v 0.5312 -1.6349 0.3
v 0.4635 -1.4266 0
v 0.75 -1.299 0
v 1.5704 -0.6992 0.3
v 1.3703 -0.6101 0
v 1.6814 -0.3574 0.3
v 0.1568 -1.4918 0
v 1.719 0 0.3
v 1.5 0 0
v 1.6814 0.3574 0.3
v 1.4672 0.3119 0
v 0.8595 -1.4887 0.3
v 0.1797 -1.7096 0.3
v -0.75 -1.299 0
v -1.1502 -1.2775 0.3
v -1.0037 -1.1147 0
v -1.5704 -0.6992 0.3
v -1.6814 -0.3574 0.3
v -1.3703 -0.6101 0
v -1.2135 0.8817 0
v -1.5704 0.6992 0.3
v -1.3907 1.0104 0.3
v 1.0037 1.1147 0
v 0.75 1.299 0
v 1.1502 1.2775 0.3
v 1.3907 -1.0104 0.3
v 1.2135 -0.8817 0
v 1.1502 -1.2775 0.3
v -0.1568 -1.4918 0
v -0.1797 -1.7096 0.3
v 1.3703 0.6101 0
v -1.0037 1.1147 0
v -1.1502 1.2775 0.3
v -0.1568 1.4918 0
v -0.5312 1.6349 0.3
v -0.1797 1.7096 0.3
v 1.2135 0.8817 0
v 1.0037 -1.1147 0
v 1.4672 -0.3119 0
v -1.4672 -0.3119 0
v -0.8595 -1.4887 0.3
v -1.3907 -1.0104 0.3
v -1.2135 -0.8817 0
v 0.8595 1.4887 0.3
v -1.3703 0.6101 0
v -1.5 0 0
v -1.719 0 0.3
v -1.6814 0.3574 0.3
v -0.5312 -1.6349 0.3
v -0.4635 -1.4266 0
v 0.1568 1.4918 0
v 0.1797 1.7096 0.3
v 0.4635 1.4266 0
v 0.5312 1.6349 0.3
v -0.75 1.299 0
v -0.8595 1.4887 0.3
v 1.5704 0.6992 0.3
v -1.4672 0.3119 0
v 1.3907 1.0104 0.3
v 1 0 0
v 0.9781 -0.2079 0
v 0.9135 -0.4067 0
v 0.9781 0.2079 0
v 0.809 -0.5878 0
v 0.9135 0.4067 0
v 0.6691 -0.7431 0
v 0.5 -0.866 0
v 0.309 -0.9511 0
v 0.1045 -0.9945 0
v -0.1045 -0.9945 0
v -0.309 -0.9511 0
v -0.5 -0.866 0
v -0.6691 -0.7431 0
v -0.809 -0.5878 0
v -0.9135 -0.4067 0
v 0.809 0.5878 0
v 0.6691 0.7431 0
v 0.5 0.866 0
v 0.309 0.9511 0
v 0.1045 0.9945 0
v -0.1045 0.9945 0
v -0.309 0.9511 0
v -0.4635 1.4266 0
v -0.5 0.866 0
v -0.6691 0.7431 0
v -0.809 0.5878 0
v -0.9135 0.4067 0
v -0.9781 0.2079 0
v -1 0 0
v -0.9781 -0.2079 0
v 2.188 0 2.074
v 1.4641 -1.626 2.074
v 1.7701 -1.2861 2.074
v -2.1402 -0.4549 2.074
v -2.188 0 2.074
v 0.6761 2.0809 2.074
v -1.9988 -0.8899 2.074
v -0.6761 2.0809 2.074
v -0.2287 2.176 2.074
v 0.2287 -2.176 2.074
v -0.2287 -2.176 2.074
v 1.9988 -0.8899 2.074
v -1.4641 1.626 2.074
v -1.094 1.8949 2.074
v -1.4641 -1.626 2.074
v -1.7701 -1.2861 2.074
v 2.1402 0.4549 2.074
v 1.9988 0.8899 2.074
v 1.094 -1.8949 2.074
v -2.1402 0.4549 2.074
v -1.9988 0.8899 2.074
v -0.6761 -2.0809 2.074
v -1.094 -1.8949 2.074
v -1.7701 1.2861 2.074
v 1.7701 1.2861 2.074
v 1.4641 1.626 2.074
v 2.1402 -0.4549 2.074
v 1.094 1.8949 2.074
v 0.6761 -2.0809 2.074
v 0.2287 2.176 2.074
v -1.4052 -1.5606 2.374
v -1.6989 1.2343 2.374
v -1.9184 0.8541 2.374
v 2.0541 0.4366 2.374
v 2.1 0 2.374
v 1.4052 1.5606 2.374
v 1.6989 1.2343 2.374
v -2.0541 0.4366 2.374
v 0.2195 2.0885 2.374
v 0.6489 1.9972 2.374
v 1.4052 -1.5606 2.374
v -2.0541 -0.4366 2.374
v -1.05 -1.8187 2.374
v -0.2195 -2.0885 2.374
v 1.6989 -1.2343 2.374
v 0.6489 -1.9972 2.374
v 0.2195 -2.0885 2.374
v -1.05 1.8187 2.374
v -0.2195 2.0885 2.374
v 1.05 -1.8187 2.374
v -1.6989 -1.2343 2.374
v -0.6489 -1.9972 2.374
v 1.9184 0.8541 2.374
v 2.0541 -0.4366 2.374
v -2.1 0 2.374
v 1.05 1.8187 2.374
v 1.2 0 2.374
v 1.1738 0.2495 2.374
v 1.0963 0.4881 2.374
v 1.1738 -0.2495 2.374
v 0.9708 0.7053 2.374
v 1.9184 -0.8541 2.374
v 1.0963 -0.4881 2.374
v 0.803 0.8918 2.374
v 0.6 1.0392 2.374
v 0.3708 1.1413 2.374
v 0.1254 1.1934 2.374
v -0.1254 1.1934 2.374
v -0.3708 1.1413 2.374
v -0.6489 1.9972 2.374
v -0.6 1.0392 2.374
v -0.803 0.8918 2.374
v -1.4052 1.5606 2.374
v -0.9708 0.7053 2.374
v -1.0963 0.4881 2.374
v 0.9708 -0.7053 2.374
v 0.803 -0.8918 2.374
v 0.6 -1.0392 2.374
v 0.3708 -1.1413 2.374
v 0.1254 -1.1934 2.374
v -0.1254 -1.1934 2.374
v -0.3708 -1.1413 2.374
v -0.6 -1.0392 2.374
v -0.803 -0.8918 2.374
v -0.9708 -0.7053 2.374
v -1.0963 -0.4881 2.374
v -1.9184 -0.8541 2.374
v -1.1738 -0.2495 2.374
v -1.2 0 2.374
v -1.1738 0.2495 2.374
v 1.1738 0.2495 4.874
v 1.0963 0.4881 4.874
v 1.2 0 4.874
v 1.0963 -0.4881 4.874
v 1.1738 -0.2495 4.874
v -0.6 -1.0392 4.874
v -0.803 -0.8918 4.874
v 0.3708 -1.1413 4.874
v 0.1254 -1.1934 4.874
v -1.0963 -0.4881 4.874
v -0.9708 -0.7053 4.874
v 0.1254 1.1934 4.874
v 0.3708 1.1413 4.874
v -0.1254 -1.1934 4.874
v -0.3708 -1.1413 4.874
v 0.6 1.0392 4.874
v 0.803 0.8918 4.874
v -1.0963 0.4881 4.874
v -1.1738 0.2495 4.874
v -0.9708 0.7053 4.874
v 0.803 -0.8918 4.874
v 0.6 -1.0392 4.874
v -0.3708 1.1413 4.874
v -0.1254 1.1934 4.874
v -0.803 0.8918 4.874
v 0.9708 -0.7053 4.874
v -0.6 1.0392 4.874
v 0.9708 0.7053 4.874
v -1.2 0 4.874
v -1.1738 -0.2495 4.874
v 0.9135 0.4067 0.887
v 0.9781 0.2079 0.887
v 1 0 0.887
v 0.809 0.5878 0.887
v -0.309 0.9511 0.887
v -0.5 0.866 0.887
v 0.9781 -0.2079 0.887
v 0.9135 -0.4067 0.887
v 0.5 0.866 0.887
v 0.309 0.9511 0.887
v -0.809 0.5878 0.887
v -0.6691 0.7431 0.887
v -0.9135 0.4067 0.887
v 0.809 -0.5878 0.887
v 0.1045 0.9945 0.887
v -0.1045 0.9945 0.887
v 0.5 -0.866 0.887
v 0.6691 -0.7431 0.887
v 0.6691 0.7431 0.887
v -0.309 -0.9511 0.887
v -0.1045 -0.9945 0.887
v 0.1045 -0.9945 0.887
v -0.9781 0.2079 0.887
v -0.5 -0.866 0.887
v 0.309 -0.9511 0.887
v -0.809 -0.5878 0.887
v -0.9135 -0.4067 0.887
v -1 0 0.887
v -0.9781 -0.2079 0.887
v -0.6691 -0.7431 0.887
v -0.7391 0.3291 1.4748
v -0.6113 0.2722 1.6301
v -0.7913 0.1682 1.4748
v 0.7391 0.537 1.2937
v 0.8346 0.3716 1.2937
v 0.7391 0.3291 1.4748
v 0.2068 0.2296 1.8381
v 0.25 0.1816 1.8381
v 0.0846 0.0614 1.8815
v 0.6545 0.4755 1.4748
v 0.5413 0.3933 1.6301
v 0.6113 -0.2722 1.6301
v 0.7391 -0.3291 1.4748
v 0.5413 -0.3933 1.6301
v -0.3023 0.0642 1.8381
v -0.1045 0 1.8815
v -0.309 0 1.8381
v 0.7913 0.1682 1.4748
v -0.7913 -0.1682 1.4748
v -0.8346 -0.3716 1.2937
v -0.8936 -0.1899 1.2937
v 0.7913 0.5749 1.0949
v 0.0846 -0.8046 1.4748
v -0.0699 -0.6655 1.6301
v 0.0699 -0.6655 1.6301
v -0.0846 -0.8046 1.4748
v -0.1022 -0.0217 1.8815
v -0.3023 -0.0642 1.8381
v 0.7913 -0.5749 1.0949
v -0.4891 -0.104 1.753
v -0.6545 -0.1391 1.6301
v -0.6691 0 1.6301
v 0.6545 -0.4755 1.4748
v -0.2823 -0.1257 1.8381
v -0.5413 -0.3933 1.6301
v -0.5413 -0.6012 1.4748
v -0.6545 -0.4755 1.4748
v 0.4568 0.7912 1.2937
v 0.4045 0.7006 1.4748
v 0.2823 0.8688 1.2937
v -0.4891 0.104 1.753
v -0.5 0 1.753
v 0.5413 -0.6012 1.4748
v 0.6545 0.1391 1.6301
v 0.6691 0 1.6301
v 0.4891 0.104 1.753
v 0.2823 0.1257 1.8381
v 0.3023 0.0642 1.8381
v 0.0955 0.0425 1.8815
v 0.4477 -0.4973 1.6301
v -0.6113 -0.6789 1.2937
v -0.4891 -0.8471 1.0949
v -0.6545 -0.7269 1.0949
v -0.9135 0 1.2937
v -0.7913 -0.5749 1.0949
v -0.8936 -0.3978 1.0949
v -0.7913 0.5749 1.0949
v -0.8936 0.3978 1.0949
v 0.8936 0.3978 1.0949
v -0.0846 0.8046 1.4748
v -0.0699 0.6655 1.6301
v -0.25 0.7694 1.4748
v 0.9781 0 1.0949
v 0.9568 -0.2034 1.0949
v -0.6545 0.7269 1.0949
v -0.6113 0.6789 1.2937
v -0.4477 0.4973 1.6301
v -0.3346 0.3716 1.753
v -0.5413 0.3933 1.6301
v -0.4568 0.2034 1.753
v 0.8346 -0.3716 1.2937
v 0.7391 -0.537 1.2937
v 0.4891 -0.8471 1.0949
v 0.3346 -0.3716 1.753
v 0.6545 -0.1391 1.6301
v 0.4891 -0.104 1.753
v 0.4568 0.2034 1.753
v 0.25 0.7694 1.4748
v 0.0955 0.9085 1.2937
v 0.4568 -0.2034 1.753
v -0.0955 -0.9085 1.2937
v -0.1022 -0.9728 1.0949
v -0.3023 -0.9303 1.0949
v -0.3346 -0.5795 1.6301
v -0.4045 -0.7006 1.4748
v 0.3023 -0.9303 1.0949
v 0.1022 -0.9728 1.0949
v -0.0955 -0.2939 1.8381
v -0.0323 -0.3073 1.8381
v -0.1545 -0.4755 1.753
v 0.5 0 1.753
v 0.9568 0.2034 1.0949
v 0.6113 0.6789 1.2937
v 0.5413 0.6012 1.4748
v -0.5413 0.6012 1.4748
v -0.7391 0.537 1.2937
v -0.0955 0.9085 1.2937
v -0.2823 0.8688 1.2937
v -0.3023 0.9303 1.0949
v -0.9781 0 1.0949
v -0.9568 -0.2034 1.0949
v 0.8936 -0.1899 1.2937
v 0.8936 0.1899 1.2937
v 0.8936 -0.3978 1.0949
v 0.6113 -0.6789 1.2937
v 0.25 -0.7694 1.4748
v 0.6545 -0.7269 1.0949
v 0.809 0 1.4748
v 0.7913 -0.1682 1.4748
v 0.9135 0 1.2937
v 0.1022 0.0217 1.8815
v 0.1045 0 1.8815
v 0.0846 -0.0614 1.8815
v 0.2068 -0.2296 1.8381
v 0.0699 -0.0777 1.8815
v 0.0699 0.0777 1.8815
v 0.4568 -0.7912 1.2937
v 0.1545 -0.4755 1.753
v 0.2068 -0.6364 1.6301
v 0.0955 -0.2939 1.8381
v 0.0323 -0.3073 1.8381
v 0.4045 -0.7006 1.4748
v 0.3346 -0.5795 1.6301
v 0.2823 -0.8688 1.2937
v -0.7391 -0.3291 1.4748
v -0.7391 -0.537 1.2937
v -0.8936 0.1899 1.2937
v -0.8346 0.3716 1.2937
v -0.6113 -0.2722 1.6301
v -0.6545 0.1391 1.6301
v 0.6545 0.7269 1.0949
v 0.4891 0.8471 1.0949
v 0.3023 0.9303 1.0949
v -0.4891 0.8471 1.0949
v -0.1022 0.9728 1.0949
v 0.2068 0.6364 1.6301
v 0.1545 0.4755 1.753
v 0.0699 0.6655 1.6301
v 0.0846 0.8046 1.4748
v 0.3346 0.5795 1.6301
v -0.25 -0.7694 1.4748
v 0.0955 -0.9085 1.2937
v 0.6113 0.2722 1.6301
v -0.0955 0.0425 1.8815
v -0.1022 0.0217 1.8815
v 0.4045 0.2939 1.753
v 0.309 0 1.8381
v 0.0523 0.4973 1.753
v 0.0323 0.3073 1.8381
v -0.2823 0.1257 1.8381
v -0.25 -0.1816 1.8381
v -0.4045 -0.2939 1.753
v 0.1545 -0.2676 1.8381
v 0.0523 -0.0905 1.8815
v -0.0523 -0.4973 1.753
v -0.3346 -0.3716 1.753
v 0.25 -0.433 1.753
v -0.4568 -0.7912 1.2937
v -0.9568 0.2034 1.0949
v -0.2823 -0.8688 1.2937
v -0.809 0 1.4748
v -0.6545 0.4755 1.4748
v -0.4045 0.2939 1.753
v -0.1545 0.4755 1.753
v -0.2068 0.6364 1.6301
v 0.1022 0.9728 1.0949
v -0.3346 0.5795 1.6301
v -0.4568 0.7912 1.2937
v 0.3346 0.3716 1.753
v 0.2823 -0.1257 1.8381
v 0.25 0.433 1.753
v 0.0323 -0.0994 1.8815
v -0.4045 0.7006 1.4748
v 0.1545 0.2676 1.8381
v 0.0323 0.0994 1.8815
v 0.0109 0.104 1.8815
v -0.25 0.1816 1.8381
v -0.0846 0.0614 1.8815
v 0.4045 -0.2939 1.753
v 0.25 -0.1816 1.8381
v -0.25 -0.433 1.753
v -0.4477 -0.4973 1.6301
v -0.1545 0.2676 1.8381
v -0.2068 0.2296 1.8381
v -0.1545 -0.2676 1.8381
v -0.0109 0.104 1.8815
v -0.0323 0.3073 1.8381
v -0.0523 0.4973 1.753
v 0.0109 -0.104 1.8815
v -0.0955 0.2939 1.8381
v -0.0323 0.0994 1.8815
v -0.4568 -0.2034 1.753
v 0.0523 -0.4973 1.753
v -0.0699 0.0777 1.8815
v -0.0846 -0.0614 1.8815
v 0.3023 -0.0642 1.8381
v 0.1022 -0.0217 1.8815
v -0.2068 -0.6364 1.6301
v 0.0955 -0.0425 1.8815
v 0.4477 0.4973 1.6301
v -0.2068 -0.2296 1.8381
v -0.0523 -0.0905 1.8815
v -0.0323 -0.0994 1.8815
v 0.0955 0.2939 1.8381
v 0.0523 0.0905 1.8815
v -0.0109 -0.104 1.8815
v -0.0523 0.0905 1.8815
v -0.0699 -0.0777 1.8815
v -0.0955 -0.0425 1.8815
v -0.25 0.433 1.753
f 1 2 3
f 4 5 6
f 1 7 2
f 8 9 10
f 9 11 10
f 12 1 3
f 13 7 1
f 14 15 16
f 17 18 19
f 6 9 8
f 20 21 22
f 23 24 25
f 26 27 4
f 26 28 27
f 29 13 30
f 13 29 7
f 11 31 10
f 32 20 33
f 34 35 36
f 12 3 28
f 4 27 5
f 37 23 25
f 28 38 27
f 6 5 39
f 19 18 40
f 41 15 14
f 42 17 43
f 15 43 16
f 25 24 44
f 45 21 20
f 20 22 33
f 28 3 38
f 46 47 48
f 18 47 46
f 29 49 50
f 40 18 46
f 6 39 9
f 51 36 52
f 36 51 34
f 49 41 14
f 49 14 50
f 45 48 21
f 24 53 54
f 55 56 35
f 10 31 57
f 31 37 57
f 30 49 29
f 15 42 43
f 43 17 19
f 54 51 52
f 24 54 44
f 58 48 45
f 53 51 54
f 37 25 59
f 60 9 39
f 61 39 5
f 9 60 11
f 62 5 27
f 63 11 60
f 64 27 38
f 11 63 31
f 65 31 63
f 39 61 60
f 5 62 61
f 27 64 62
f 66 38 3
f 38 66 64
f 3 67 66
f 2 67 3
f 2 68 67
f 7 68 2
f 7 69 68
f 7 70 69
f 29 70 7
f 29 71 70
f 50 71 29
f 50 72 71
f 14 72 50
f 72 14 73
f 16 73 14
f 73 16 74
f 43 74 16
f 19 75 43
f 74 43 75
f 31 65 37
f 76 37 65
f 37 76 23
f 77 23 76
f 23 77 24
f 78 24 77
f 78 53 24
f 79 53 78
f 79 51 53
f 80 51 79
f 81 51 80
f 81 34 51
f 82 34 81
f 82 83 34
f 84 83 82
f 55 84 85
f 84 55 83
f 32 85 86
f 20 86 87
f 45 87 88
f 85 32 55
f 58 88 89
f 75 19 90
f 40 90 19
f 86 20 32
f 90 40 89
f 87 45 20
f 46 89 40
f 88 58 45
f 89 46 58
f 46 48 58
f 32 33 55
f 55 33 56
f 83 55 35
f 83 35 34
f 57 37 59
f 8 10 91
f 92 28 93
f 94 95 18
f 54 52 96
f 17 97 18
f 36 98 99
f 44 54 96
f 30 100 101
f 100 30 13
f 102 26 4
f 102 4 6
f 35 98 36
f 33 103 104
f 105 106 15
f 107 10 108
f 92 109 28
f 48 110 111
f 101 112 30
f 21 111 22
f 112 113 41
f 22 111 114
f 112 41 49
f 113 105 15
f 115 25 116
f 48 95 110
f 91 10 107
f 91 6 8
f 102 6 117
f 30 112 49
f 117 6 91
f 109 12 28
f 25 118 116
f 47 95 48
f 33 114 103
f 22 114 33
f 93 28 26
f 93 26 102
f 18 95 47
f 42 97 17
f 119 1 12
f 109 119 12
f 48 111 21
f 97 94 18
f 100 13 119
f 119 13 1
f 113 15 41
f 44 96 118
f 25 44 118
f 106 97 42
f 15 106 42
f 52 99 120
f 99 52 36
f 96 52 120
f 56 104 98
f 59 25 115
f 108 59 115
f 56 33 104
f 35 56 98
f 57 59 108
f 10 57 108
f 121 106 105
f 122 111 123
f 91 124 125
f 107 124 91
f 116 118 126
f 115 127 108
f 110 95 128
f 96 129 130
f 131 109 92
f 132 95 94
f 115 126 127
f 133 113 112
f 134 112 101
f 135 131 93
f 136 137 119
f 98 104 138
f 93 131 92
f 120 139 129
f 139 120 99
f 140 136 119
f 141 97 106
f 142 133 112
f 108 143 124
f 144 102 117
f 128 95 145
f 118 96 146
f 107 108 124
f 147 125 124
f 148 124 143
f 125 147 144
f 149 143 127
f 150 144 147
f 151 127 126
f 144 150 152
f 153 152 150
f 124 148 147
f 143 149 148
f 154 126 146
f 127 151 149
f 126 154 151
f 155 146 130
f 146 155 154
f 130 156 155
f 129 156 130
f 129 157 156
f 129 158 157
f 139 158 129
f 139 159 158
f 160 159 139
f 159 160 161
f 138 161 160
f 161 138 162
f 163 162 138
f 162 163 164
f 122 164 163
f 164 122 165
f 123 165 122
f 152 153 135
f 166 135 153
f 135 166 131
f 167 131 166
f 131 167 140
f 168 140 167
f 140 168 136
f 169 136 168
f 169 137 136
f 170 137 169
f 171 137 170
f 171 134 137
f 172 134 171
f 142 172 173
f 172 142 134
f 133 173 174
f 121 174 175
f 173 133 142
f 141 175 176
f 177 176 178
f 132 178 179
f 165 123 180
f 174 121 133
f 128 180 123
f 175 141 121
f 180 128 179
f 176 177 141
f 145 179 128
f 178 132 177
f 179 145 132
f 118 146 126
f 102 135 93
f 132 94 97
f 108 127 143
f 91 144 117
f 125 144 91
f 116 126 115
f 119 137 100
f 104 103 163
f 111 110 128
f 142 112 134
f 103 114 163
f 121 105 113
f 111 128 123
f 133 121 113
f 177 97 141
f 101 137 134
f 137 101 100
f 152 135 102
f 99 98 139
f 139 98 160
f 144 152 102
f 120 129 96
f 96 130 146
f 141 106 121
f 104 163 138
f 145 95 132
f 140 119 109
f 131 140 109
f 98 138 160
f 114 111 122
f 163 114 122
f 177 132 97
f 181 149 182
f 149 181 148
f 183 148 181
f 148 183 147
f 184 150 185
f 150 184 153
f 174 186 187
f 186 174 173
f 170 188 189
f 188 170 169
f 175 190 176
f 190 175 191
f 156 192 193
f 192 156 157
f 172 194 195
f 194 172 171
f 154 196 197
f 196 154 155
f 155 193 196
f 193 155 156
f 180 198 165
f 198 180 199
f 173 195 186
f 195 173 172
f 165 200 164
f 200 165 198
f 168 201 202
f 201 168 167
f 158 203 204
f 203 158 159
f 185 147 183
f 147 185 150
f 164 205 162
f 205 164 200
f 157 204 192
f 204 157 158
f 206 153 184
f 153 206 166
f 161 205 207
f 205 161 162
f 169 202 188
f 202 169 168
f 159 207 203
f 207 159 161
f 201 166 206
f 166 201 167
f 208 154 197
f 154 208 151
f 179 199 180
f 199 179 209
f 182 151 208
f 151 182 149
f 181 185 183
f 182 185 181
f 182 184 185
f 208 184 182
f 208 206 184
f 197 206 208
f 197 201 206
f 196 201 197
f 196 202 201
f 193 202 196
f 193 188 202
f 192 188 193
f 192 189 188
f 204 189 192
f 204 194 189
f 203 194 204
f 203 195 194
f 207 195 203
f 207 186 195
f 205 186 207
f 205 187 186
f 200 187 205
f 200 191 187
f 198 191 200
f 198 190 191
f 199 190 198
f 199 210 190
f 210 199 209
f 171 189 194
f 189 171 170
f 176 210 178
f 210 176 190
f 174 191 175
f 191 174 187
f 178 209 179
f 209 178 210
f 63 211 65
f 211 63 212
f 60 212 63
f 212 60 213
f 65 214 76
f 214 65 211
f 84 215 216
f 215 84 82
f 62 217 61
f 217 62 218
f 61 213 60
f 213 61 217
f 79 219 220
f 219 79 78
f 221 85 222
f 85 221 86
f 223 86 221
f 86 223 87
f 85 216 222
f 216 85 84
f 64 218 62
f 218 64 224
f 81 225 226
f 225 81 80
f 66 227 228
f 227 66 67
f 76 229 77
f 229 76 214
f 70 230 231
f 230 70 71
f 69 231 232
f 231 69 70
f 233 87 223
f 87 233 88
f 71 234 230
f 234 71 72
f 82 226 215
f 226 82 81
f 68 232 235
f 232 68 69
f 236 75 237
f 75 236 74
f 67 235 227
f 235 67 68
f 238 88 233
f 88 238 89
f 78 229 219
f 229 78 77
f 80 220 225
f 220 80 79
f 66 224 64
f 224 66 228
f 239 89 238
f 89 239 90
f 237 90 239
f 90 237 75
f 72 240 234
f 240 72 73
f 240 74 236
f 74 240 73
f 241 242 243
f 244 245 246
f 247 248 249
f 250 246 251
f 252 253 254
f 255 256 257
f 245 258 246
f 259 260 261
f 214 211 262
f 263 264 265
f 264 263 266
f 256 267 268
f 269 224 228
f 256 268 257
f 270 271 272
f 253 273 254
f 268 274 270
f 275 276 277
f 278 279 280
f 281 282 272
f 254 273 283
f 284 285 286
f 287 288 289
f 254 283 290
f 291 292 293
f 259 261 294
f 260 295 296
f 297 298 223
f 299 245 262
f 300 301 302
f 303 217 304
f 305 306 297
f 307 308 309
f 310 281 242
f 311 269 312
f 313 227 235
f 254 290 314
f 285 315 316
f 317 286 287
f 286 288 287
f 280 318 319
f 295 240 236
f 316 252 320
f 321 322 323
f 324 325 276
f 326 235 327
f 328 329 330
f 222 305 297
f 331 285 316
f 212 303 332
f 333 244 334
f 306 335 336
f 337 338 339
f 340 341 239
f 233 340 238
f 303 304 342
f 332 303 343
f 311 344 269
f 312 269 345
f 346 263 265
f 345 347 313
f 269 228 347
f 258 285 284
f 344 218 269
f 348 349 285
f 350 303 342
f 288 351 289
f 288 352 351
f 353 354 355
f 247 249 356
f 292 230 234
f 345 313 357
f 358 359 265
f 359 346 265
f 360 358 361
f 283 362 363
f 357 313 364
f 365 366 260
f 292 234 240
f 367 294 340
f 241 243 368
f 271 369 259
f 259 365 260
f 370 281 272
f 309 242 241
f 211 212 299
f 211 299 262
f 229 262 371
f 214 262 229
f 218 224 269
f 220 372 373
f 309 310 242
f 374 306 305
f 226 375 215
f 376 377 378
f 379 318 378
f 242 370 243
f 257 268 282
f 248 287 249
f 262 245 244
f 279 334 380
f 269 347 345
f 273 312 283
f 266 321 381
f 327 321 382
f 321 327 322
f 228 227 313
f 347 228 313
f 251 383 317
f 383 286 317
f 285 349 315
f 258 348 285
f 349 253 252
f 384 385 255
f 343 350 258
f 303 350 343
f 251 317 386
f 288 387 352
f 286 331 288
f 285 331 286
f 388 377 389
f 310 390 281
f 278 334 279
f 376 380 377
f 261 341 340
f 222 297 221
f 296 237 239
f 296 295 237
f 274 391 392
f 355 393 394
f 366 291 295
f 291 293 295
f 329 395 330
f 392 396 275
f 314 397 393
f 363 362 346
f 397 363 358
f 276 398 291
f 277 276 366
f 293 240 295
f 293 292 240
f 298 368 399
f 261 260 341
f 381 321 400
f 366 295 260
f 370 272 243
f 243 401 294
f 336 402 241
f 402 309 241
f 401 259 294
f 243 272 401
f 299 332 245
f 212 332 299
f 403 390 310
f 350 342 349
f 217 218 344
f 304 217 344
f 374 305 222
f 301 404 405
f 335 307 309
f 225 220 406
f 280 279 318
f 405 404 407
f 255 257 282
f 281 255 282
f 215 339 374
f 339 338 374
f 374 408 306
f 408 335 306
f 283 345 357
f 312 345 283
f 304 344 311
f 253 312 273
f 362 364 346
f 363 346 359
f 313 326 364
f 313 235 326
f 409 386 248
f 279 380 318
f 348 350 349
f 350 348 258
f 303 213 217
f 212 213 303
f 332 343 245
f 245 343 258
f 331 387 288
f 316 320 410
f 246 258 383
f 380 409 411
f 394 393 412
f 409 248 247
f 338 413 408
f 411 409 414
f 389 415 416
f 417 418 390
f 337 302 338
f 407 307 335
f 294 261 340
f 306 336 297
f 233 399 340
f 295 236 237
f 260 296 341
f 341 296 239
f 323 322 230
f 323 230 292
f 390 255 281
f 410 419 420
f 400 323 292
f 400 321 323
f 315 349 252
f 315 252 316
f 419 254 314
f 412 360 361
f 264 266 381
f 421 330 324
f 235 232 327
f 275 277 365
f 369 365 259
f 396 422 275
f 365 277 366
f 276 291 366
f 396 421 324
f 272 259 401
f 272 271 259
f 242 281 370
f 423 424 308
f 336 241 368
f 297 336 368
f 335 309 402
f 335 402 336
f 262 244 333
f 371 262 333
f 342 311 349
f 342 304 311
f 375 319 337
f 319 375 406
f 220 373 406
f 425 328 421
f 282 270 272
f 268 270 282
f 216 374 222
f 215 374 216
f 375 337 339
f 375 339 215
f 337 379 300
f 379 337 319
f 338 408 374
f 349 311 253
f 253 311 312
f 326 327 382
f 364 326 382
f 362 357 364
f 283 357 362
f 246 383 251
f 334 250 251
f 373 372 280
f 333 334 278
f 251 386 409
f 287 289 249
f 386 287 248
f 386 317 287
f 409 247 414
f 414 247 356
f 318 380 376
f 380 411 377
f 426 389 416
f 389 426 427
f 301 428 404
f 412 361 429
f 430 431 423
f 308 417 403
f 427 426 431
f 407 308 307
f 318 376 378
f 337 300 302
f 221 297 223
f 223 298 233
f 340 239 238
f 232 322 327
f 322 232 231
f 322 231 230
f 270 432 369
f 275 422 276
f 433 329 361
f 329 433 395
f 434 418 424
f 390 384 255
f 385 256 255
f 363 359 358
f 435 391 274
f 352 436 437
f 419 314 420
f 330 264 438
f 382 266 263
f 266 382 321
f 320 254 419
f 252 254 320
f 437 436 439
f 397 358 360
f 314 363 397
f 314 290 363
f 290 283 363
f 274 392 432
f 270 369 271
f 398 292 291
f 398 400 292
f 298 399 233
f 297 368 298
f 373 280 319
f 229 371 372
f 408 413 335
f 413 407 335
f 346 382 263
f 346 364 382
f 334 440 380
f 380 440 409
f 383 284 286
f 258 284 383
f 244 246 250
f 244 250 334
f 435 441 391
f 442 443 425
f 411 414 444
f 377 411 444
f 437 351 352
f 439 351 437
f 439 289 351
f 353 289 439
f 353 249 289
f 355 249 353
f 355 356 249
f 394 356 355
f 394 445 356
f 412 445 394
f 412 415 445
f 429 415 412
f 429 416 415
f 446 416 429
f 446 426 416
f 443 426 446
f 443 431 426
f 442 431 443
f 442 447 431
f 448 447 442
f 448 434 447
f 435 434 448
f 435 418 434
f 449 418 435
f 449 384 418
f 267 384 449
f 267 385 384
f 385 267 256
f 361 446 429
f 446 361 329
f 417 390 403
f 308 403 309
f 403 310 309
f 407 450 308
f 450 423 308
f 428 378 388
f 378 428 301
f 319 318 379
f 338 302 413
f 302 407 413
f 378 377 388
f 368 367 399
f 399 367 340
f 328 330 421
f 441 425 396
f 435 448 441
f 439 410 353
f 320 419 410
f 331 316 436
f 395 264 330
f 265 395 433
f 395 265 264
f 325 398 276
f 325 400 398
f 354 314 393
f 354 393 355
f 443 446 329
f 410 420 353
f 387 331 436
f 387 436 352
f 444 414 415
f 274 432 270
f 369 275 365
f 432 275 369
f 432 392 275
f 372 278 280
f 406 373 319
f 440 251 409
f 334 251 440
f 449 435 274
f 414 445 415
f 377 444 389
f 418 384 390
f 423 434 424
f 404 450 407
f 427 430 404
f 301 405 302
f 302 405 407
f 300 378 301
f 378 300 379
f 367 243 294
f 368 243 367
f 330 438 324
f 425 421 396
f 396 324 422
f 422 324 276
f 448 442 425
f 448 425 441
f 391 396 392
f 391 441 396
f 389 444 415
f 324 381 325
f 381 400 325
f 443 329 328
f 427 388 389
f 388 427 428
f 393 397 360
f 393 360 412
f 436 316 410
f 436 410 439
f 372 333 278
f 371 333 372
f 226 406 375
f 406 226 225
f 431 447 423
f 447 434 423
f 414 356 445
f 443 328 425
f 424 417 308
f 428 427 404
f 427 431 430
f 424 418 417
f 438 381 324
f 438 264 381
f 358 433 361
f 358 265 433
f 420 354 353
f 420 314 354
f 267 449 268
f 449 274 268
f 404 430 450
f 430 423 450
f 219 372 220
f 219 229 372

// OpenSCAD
$fn=30;
noz=0.3;
cyllen=1.774;
smdiam=1.719;
lgdiam=2.188;
inner=1;
difference() {
    union() {
        translate([0,0,0]) cylinder(h=noz,r2=smdiam,r1=1.5);  // outer bevel
        translate([0,0,noz]) cylinder(h=cyllen,r1=smdiam,r2=lgdiam);  // main
        translate([0,0,noz+cyllen]) cylinder(h=noz,r1=lgdiam,r2=2.1); //inner bevel
        translate([0,0,2*noz+cyllen]) cylinder(h=2.5,r=1.2);  // shaft
    }
    union() {
        cylinder(h=cyllen,r=inner,center=true);
        translate([0,0,cyllen/2]) sphere(inner);
    }
}
